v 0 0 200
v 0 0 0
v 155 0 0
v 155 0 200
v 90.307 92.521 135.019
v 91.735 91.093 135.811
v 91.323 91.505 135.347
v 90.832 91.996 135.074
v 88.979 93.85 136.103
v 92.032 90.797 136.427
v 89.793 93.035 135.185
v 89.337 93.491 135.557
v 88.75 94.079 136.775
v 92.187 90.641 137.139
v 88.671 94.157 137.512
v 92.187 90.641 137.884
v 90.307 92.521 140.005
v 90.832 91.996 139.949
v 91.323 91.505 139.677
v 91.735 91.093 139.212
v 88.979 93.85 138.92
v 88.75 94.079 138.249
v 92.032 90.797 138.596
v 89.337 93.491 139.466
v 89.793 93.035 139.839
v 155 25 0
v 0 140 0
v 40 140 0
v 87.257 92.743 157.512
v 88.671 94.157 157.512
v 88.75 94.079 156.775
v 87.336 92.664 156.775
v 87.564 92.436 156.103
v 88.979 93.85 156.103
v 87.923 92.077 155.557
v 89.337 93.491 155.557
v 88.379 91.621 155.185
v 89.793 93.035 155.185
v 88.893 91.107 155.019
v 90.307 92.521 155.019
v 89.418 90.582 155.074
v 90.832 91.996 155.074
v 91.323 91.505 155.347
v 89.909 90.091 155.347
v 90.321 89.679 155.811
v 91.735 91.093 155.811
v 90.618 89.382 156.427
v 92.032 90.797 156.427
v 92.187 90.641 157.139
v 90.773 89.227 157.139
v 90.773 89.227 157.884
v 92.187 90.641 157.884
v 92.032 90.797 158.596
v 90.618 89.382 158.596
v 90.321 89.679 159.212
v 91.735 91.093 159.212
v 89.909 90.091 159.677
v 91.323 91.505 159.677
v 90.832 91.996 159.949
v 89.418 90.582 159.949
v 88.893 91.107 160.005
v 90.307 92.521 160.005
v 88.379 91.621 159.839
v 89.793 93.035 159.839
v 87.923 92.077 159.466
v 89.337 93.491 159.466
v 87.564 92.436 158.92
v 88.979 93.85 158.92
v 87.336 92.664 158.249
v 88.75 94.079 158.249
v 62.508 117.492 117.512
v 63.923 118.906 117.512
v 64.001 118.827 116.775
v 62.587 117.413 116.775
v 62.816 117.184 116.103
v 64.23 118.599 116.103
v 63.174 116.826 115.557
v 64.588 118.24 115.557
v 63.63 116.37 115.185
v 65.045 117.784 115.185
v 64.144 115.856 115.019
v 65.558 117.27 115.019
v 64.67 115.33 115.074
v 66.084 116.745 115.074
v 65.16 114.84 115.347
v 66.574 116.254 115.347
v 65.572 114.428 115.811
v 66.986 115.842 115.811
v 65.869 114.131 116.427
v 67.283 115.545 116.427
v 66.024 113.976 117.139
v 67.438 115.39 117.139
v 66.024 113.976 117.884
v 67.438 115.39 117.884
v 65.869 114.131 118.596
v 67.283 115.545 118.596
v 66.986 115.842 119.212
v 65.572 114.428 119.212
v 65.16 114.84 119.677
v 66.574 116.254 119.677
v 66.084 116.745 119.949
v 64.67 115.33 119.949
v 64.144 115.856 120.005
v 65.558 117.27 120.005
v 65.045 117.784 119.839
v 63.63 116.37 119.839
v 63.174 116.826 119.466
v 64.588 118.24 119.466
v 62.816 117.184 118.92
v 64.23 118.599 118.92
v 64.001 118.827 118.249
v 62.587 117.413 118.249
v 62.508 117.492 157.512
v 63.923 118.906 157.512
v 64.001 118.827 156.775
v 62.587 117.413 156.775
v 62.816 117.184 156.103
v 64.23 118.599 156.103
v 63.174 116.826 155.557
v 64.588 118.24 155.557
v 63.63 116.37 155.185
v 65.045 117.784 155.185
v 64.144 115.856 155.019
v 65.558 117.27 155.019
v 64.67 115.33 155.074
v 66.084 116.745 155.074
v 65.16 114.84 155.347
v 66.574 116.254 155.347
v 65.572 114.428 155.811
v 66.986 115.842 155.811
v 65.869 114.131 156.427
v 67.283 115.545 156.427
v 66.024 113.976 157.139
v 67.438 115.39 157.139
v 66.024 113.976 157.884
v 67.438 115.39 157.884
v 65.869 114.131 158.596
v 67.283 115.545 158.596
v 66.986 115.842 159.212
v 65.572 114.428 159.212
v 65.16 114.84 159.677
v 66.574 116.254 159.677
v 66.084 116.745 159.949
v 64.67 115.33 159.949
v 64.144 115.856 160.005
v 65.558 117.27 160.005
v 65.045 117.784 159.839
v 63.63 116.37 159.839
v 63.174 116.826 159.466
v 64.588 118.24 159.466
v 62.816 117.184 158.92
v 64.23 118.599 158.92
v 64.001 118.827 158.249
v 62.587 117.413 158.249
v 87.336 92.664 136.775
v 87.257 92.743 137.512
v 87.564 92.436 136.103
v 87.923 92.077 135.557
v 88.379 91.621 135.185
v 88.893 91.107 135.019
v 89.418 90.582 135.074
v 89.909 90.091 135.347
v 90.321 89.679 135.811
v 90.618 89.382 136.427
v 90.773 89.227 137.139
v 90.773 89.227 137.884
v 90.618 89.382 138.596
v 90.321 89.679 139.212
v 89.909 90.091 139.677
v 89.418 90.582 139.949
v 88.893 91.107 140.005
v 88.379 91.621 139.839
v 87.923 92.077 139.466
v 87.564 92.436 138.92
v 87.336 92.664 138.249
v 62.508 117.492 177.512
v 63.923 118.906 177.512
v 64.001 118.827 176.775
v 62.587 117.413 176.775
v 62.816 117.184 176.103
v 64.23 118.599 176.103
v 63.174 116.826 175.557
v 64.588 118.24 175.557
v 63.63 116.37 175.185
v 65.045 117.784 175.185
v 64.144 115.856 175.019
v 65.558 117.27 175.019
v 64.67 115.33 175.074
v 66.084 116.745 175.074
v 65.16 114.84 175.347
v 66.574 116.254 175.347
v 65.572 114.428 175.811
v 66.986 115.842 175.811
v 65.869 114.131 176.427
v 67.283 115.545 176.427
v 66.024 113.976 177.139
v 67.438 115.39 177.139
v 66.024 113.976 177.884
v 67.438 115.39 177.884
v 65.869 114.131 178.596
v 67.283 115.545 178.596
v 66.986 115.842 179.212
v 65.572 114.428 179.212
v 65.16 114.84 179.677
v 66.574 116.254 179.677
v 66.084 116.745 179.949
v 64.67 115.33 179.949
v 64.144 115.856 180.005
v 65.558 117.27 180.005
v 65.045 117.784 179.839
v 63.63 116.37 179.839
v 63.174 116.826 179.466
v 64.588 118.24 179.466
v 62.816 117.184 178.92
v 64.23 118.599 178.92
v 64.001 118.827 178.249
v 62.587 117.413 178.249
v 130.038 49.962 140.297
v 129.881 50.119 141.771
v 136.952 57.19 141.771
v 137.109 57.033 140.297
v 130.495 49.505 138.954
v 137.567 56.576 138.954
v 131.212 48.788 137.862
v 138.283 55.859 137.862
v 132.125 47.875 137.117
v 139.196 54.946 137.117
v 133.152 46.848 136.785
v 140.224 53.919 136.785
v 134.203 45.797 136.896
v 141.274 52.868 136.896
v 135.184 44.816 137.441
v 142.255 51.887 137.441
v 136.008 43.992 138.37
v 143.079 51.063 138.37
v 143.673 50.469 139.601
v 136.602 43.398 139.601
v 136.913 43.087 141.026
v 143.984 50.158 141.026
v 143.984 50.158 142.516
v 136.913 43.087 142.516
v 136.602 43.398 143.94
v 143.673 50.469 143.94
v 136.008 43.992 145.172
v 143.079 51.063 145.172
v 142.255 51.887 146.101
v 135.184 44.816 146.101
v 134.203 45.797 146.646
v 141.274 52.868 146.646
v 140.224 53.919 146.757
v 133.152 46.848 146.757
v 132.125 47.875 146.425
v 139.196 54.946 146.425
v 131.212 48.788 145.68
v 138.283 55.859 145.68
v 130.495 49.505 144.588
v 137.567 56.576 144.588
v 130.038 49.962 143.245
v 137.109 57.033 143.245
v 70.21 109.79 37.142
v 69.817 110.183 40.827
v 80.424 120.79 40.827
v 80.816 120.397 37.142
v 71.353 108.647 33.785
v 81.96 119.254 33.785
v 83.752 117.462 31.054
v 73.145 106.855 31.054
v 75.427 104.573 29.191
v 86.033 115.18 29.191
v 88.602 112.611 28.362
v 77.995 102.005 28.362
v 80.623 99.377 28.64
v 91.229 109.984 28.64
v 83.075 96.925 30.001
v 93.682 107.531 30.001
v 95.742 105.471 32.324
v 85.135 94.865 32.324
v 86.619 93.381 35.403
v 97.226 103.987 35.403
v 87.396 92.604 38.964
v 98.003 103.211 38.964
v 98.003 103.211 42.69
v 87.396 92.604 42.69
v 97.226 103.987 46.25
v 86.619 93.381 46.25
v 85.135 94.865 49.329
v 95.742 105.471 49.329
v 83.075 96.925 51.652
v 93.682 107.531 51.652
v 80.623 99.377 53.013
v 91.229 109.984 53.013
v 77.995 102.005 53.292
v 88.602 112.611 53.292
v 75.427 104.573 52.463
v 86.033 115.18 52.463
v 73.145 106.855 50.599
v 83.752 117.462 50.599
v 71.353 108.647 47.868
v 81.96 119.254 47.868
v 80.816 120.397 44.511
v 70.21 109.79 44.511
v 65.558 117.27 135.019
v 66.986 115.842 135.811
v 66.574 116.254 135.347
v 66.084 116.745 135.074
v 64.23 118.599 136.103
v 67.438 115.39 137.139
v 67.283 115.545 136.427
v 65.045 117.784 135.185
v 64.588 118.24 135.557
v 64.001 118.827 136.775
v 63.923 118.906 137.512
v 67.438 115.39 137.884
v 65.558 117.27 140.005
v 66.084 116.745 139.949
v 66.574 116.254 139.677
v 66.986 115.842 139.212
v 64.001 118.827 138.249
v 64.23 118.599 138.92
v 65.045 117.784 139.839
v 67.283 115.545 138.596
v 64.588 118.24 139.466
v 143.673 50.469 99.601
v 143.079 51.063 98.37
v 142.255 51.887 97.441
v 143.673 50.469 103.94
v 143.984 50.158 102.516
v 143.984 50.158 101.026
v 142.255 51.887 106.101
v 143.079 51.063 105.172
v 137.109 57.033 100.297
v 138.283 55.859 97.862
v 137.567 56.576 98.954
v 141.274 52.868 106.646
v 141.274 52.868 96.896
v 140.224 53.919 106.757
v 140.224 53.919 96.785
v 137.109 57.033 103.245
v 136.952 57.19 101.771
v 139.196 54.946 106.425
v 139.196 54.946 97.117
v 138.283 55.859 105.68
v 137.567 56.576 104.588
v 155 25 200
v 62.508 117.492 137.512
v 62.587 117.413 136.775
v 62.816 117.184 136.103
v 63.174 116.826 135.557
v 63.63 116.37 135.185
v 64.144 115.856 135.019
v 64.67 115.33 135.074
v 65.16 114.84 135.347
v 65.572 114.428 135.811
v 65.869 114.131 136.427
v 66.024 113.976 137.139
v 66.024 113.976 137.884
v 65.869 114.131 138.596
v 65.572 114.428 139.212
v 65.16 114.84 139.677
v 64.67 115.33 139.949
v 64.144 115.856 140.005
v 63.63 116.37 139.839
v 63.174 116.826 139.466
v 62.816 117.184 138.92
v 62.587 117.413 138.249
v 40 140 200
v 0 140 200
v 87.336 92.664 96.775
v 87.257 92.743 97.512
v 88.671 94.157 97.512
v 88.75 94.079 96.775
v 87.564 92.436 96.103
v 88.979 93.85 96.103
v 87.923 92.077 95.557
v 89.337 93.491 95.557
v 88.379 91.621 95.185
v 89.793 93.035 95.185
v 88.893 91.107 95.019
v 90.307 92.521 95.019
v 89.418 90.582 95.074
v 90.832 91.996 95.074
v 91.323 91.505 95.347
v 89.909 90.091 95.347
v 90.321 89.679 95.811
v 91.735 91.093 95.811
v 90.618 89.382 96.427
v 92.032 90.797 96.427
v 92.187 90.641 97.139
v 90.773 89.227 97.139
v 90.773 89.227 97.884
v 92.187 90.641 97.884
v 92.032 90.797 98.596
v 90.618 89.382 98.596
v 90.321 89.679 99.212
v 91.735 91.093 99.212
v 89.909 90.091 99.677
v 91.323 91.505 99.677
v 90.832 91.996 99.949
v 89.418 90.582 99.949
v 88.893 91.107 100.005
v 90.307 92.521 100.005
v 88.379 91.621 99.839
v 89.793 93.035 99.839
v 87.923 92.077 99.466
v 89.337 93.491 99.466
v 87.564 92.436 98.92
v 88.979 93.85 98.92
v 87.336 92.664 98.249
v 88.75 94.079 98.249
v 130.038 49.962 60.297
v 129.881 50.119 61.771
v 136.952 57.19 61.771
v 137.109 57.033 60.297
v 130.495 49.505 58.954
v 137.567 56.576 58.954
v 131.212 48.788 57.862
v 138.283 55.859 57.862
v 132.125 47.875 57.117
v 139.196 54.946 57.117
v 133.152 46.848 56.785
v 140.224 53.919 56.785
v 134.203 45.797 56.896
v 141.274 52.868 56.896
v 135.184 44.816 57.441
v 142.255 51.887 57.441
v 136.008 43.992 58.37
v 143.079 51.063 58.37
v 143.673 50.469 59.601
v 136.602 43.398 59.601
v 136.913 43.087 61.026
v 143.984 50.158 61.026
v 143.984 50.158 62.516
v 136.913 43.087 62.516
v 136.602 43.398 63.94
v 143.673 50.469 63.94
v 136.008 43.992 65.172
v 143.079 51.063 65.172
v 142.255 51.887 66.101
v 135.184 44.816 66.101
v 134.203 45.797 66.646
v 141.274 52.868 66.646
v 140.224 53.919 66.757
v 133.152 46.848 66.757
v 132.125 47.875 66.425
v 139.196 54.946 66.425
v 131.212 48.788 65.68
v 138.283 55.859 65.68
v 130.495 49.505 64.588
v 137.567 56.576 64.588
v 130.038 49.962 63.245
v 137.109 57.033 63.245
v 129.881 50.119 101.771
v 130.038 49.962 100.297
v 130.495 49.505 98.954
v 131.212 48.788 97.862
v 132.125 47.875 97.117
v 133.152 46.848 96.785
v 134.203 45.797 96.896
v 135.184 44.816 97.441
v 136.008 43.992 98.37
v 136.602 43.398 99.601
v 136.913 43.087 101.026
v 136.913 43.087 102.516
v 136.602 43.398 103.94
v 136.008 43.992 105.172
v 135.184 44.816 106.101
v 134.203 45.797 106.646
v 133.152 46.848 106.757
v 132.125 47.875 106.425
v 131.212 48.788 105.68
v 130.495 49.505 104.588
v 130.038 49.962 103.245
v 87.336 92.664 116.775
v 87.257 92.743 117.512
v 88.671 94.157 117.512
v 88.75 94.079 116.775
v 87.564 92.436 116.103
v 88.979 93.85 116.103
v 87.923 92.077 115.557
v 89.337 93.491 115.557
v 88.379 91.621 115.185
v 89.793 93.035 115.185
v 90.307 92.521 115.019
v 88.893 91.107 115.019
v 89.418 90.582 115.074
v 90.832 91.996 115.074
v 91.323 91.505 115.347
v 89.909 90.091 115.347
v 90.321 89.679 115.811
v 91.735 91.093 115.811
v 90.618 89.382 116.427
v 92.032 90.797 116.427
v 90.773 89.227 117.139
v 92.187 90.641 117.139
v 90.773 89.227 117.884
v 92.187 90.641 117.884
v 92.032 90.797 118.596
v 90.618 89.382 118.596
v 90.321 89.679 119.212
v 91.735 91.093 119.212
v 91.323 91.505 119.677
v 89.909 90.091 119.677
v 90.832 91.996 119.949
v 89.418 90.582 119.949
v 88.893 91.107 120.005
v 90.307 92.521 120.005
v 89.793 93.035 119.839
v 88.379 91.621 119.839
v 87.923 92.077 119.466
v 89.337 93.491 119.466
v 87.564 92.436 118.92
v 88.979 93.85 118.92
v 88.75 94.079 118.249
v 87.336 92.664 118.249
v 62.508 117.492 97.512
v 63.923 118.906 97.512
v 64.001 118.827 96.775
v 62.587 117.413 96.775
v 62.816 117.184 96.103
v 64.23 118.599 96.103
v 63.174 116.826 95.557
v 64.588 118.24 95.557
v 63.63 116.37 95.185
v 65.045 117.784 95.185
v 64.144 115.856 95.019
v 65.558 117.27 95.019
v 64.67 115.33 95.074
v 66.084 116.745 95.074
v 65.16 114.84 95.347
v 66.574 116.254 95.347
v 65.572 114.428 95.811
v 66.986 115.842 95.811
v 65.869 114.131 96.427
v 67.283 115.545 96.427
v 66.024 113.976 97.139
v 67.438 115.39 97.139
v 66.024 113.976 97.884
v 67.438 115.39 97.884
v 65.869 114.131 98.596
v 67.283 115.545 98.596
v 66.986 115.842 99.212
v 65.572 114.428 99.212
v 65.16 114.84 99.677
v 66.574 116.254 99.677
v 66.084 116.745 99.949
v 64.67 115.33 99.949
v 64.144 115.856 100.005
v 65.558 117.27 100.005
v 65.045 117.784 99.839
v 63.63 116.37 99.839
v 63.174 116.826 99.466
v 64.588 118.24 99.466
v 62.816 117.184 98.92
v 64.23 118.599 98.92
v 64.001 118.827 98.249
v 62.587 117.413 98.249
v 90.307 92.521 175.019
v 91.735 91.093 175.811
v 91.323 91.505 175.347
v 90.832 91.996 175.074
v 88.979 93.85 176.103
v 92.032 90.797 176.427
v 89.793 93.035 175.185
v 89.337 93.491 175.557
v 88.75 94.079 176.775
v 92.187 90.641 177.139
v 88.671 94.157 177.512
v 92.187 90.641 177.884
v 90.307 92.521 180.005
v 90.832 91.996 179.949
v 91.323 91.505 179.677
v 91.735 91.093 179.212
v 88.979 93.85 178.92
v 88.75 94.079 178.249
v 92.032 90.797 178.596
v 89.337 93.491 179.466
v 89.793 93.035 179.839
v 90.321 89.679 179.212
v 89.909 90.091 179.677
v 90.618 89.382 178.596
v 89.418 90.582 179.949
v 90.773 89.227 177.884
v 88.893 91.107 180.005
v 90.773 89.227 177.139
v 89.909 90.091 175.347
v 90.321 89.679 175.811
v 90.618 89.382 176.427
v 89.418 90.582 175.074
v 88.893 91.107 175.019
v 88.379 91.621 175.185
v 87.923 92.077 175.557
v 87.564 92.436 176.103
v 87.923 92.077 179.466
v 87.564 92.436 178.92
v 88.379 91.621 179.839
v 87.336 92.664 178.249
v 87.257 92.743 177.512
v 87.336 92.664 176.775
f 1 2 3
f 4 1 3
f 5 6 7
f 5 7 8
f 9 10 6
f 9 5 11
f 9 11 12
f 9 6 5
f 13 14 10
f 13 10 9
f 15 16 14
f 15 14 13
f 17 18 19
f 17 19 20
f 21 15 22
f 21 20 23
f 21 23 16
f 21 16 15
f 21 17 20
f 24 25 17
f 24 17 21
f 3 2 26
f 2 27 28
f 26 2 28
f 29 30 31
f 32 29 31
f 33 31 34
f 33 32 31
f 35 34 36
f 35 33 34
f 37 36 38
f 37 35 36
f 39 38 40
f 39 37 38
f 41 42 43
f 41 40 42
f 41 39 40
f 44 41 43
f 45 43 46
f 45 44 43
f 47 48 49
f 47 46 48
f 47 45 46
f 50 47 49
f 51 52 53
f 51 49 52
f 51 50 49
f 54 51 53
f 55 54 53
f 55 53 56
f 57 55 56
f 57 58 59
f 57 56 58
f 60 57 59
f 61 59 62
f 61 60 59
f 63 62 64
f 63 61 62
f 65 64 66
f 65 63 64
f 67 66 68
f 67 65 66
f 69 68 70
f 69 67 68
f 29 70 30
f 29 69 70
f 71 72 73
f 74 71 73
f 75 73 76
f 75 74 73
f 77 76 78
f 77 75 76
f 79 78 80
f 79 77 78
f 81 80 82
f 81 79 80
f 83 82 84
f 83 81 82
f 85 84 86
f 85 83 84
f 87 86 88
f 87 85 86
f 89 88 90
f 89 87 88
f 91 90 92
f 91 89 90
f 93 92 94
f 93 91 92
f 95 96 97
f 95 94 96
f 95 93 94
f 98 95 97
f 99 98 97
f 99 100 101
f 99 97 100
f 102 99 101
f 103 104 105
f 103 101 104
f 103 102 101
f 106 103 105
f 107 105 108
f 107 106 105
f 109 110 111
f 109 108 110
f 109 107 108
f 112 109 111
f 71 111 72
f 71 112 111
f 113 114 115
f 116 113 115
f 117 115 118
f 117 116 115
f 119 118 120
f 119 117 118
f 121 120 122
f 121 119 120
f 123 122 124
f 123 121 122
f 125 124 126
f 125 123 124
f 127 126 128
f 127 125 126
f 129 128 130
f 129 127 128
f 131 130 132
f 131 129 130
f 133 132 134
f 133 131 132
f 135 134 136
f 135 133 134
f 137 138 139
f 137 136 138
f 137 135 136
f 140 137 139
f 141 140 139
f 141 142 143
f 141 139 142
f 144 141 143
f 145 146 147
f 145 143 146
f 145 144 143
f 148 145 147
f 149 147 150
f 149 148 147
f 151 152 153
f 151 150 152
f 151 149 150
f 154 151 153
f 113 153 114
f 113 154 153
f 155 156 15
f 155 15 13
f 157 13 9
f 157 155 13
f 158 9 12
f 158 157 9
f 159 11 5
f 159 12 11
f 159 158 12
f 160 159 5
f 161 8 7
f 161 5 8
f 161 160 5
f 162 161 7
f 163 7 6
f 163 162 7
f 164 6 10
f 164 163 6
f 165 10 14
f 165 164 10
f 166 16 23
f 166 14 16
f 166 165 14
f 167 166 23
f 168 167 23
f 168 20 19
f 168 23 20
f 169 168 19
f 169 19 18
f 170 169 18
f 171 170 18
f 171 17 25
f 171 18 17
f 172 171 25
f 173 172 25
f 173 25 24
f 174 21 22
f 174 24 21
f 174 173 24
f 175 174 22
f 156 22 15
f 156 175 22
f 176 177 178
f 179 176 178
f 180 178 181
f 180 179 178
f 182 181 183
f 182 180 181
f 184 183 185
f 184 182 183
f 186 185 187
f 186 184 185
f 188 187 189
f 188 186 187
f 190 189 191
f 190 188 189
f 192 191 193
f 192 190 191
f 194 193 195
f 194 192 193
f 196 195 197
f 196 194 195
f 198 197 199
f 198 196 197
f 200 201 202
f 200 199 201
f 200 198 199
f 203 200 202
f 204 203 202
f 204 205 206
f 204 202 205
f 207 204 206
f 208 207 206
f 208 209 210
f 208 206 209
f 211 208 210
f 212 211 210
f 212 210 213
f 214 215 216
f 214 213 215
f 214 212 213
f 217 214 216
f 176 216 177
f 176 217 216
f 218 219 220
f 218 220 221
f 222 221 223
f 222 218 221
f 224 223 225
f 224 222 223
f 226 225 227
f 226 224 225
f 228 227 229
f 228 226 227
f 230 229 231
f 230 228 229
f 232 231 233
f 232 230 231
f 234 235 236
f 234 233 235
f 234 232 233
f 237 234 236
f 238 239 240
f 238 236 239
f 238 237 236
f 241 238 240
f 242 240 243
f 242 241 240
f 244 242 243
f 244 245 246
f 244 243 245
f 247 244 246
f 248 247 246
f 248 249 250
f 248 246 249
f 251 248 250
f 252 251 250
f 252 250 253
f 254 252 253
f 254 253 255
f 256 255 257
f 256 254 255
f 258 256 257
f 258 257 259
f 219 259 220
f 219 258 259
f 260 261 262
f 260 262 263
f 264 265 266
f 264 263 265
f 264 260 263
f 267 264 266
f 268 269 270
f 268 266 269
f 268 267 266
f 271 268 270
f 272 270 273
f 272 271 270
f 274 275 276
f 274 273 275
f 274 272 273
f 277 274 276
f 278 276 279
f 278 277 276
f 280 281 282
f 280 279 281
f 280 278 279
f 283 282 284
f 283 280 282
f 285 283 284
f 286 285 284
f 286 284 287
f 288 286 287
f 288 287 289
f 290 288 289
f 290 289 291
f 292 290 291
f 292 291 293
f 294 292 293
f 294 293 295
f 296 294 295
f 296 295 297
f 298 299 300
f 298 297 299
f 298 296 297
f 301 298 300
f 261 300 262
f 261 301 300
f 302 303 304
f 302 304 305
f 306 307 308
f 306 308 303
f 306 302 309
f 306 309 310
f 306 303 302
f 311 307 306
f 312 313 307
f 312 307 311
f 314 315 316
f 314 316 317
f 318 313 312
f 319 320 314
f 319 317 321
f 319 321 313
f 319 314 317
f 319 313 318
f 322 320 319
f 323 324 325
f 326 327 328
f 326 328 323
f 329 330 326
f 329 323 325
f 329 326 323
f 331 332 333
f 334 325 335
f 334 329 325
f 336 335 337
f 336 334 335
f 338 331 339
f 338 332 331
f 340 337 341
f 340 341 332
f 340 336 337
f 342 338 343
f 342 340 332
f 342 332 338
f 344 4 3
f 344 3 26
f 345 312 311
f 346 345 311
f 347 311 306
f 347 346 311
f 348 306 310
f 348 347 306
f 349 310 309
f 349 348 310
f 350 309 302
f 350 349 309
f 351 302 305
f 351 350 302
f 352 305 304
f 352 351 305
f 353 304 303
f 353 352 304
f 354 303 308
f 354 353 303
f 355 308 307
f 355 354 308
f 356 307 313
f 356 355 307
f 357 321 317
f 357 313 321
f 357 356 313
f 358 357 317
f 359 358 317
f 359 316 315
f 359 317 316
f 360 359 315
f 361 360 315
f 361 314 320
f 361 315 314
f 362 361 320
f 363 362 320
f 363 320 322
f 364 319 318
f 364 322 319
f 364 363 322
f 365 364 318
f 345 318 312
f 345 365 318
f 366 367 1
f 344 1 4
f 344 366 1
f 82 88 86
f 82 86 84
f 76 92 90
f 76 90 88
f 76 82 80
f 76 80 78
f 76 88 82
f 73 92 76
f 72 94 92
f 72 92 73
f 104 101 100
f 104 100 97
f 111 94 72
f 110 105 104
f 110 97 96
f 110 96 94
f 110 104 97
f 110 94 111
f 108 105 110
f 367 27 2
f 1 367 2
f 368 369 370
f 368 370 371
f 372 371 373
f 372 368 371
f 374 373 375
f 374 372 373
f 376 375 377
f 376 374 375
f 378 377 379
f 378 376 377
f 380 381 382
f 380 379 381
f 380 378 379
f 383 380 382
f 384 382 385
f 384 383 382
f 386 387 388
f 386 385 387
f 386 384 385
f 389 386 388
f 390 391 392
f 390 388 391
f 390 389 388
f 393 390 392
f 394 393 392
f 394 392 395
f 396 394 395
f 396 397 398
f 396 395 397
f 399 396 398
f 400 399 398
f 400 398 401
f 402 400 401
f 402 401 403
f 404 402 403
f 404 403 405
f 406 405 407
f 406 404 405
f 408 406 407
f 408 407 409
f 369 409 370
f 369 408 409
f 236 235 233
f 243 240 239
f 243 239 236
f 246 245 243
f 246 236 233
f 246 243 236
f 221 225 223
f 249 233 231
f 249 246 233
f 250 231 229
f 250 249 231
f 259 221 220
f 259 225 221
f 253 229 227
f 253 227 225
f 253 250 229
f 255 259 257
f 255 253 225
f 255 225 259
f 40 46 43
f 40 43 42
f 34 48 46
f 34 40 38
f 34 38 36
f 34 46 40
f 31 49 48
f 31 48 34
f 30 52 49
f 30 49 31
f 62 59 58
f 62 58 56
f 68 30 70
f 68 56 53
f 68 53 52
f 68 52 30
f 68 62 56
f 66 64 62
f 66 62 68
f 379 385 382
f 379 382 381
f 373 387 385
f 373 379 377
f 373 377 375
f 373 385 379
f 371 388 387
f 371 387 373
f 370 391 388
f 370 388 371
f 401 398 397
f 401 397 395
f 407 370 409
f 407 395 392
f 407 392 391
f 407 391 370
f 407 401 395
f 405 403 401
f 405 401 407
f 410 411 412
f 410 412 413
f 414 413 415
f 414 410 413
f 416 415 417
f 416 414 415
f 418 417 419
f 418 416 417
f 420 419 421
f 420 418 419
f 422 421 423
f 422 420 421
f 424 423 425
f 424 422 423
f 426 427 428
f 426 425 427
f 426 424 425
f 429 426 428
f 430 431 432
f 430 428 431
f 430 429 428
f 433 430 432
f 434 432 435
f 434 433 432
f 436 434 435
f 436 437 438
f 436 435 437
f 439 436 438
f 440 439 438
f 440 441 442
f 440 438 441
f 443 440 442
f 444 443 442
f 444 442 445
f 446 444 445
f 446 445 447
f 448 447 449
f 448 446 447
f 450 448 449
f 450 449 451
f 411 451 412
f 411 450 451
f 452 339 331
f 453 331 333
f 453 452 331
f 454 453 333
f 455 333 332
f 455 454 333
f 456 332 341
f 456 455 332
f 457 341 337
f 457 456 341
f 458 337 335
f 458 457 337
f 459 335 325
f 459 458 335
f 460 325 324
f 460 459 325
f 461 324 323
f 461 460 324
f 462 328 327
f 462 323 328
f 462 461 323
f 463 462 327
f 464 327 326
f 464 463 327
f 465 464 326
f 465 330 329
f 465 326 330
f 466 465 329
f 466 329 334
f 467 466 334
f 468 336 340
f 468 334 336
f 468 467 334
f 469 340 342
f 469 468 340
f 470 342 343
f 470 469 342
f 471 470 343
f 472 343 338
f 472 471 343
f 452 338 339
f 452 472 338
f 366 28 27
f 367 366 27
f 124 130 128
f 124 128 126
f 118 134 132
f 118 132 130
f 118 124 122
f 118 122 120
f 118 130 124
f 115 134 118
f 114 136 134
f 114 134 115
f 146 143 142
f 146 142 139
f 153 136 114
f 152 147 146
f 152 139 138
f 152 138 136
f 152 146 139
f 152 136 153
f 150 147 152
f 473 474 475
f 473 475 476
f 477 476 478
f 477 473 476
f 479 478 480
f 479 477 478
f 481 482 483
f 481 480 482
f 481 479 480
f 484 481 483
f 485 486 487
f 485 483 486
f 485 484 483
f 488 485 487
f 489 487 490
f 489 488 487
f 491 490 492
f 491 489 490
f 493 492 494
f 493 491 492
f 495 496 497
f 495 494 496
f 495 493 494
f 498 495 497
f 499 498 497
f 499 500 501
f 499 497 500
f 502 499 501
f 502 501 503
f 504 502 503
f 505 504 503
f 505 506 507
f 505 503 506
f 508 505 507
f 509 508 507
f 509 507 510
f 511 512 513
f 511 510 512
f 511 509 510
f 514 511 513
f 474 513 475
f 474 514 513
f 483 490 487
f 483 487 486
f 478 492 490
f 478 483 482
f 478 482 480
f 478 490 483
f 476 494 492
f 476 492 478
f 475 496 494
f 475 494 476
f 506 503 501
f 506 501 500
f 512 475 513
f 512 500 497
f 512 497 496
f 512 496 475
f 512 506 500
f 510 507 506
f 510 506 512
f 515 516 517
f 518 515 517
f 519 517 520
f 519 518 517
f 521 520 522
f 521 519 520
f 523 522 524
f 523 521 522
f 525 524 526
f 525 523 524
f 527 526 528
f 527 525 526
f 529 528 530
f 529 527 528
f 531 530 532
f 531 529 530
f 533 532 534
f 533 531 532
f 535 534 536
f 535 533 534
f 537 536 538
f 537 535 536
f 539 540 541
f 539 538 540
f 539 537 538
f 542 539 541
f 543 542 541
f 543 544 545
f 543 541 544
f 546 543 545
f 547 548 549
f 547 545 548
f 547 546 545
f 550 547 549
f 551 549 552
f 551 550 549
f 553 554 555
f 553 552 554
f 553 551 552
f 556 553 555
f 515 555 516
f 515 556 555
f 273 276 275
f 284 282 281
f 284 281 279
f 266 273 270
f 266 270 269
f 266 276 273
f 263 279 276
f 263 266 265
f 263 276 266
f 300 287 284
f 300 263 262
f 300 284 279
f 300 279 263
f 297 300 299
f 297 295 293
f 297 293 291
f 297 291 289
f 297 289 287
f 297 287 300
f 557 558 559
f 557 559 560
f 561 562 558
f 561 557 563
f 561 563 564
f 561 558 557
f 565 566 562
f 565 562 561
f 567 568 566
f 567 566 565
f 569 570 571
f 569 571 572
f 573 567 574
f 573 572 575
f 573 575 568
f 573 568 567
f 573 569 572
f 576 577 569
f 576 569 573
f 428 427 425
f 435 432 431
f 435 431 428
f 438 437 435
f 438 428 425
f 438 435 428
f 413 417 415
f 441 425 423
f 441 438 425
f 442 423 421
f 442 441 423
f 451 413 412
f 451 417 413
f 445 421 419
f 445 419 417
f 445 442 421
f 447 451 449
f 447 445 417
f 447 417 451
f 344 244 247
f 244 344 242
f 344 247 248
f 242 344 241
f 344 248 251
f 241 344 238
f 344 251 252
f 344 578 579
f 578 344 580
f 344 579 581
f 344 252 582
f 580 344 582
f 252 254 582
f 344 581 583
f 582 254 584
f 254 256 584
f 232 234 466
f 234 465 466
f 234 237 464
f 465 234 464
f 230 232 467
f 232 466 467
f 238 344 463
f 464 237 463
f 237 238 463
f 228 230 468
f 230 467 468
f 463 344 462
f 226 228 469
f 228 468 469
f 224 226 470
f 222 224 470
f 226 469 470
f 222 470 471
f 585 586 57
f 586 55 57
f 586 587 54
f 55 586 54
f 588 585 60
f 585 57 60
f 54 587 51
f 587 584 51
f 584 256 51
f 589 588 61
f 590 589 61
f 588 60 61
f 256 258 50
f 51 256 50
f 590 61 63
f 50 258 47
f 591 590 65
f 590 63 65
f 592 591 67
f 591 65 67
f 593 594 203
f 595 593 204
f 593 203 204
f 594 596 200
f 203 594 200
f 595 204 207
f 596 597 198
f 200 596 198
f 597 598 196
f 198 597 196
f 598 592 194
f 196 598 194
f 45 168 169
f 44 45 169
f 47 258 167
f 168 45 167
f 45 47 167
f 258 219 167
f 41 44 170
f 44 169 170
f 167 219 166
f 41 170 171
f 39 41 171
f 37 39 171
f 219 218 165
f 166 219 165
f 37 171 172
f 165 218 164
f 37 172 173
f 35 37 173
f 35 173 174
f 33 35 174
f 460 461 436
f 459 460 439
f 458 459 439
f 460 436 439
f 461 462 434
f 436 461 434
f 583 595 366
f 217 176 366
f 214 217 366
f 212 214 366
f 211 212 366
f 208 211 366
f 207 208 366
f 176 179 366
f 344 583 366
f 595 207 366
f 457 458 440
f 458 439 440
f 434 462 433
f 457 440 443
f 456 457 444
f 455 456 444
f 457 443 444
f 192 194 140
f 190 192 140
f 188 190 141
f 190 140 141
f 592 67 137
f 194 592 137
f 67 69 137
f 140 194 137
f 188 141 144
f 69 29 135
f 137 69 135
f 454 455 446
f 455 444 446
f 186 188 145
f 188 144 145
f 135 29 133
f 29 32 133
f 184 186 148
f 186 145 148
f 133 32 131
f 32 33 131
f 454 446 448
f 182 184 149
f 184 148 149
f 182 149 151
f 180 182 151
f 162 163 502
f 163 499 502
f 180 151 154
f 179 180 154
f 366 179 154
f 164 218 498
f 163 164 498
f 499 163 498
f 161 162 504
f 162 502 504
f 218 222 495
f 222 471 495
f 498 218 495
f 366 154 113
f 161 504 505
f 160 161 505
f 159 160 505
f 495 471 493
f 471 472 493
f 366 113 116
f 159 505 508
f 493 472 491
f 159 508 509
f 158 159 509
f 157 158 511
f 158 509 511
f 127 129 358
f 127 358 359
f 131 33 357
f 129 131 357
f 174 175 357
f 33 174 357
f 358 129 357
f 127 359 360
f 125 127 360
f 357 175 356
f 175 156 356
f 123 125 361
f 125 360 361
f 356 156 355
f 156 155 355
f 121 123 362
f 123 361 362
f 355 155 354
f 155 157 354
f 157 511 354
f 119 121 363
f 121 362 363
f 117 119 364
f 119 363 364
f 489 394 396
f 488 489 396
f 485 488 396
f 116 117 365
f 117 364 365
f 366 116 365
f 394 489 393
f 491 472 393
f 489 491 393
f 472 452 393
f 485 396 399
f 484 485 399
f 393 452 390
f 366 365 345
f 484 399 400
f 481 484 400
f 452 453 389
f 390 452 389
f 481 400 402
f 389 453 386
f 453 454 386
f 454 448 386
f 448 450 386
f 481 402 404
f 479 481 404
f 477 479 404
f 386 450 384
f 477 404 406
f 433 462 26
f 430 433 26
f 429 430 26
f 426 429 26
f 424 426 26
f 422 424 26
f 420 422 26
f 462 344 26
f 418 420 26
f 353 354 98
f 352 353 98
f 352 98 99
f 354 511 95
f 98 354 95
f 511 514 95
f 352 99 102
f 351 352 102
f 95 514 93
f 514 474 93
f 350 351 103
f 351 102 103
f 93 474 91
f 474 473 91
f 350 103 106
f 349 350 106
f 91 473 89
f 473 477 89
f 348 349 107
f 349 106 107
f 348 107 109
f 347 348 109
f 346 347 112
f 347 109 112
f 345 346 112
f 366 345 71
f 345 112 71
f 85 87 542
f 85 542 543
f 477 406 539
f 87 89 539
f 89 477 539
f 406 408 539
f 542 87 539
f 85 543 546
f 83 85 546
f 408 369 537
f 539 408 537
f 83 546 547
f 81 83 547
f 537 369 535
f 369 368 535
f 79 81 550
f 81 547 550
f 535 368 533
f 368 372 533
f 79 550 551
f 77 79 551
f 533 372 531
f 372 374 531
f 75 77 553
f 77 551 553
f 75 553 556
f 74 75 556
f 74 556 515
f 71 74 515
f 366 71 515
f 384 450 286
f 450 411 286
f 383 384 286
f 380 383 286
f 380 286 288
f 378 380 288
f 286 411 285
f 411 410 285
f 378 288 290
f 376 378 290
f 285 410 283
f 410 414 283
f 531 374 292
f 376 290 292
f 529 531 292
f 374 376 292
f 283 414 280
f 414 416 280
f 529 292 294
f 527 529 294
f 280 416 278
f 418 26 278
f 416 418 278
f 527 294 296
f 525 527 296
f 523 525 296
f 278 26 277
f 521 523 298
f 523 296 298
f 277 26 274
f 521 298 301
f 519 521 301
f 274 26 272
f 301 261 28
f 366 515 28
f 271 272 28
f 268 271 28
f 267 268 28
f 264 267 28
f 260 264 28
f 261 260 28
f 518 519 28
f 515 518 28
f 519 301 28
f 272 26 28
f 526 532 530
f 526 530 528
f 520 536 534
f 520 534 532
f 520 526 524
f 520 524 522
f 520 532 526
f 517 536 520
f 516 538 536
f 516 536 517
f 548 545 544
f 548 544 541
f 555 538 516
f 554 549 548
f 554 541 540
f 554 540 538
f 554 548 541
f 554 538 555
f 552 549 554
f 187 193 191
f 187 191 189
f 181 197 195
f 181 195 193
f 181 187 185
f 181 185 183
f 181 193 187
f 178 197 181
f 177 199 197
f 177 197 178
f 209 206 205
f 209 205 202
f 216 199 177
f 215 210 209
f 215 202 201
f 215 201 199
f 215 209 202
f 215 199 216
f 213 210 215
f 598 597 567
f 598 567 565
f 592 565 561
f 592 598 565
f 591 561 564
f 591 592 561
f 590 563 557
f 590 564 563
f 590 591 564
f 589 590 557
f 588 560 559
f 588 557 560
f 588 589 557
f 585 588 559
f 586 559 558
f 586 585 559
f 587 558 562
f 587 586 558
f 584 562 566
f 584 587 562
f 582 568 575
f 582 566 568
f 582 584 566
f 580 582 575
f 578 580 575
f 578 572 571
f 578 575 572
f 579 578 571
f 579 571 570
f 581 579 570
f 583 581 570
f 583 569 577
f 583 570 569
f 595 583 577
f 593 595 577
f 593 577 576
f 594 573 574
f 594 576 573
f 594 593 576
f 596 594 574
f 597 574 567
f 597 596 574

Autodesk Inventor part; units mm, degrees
ref_plane "YZ Plane" through (0, 0, 0) normal (1, 0, 0) x (0, 1, 0)
ref_plane "XZ Plane" through (0, 0, 0) normal (0, 1, 0) x (-1, 0, 0)
ref_plane "XY Plane" through (0, 0, 0) normal (0, 0, 1) x (1, 0, 0)
sketch "Sketch1" plane through (0, 0, 0) normal (0, 0, 1) x (1, 0, 0)
  line L0 (0, 0) -> (155, 0)
  line L1 (155, 0) -> (155, 25)
  line L2 (155, 25) -> (40, 140)
  line L3 (40, 140) -> (0, 140)
  line L4 (0, 140) -> (0, 0)
  dimension "d4" = 40
  dimension "d5" = 140
  dimension "d10" = 25
  dimension "d13" = 45
extrude "Extrusion1" add sketch "Sketch1" along normal blind 200
sketch "Sketch2" plane through (40, 140, 0) normal (0.7071, 0.7071, 0) x (-0.7071, 0.7071, 0)
  circle A0 centre (-34.3317, 177.5117) radius 2.5
  point P0 (-70.7107, 0)
  dimension "d9" = 5
extrude "Extrusion2" add sketch "Sketch2" along normal blind 2
pattern_linear "Rectangular Pattern1" count 5 spacing 20 along (0, 0, -1) count 2 spacing 35 along (0.7071, -0.7071, 0) of "Extrusion2"
sketch "Sketch3" plane through (40, 140, 0) normal (0.7071, 0.7071, 0) x (-0.7071, 0.7071, 0)
  circle A0 centre (-54.6677, 40.8266) radius 12.5
  point P0 (-70.7107, 0)
  dimension "d20" = 25
extrude "Extrusion3" add sketch "Sketch3" along normal blind 15
sketch "Sketch4" plane through (40, 140, 0) normal (0.7071, 0.7071, 0) x (-0.7071, 0.7071, 0)
  circle A0 centre (-132.1111, 141.7709) radius 5
  point P0 (-70.7107, 0)
  dimension "d23" = 10
extrude "Extrusion4" add sketch "Sketch4" along normal blind 10
pattern_linear "Rectangular Pattern2" count 3 spacing 40 along (0, 0, -1) of "Extrusion4"
properties part number "genral outlines"
